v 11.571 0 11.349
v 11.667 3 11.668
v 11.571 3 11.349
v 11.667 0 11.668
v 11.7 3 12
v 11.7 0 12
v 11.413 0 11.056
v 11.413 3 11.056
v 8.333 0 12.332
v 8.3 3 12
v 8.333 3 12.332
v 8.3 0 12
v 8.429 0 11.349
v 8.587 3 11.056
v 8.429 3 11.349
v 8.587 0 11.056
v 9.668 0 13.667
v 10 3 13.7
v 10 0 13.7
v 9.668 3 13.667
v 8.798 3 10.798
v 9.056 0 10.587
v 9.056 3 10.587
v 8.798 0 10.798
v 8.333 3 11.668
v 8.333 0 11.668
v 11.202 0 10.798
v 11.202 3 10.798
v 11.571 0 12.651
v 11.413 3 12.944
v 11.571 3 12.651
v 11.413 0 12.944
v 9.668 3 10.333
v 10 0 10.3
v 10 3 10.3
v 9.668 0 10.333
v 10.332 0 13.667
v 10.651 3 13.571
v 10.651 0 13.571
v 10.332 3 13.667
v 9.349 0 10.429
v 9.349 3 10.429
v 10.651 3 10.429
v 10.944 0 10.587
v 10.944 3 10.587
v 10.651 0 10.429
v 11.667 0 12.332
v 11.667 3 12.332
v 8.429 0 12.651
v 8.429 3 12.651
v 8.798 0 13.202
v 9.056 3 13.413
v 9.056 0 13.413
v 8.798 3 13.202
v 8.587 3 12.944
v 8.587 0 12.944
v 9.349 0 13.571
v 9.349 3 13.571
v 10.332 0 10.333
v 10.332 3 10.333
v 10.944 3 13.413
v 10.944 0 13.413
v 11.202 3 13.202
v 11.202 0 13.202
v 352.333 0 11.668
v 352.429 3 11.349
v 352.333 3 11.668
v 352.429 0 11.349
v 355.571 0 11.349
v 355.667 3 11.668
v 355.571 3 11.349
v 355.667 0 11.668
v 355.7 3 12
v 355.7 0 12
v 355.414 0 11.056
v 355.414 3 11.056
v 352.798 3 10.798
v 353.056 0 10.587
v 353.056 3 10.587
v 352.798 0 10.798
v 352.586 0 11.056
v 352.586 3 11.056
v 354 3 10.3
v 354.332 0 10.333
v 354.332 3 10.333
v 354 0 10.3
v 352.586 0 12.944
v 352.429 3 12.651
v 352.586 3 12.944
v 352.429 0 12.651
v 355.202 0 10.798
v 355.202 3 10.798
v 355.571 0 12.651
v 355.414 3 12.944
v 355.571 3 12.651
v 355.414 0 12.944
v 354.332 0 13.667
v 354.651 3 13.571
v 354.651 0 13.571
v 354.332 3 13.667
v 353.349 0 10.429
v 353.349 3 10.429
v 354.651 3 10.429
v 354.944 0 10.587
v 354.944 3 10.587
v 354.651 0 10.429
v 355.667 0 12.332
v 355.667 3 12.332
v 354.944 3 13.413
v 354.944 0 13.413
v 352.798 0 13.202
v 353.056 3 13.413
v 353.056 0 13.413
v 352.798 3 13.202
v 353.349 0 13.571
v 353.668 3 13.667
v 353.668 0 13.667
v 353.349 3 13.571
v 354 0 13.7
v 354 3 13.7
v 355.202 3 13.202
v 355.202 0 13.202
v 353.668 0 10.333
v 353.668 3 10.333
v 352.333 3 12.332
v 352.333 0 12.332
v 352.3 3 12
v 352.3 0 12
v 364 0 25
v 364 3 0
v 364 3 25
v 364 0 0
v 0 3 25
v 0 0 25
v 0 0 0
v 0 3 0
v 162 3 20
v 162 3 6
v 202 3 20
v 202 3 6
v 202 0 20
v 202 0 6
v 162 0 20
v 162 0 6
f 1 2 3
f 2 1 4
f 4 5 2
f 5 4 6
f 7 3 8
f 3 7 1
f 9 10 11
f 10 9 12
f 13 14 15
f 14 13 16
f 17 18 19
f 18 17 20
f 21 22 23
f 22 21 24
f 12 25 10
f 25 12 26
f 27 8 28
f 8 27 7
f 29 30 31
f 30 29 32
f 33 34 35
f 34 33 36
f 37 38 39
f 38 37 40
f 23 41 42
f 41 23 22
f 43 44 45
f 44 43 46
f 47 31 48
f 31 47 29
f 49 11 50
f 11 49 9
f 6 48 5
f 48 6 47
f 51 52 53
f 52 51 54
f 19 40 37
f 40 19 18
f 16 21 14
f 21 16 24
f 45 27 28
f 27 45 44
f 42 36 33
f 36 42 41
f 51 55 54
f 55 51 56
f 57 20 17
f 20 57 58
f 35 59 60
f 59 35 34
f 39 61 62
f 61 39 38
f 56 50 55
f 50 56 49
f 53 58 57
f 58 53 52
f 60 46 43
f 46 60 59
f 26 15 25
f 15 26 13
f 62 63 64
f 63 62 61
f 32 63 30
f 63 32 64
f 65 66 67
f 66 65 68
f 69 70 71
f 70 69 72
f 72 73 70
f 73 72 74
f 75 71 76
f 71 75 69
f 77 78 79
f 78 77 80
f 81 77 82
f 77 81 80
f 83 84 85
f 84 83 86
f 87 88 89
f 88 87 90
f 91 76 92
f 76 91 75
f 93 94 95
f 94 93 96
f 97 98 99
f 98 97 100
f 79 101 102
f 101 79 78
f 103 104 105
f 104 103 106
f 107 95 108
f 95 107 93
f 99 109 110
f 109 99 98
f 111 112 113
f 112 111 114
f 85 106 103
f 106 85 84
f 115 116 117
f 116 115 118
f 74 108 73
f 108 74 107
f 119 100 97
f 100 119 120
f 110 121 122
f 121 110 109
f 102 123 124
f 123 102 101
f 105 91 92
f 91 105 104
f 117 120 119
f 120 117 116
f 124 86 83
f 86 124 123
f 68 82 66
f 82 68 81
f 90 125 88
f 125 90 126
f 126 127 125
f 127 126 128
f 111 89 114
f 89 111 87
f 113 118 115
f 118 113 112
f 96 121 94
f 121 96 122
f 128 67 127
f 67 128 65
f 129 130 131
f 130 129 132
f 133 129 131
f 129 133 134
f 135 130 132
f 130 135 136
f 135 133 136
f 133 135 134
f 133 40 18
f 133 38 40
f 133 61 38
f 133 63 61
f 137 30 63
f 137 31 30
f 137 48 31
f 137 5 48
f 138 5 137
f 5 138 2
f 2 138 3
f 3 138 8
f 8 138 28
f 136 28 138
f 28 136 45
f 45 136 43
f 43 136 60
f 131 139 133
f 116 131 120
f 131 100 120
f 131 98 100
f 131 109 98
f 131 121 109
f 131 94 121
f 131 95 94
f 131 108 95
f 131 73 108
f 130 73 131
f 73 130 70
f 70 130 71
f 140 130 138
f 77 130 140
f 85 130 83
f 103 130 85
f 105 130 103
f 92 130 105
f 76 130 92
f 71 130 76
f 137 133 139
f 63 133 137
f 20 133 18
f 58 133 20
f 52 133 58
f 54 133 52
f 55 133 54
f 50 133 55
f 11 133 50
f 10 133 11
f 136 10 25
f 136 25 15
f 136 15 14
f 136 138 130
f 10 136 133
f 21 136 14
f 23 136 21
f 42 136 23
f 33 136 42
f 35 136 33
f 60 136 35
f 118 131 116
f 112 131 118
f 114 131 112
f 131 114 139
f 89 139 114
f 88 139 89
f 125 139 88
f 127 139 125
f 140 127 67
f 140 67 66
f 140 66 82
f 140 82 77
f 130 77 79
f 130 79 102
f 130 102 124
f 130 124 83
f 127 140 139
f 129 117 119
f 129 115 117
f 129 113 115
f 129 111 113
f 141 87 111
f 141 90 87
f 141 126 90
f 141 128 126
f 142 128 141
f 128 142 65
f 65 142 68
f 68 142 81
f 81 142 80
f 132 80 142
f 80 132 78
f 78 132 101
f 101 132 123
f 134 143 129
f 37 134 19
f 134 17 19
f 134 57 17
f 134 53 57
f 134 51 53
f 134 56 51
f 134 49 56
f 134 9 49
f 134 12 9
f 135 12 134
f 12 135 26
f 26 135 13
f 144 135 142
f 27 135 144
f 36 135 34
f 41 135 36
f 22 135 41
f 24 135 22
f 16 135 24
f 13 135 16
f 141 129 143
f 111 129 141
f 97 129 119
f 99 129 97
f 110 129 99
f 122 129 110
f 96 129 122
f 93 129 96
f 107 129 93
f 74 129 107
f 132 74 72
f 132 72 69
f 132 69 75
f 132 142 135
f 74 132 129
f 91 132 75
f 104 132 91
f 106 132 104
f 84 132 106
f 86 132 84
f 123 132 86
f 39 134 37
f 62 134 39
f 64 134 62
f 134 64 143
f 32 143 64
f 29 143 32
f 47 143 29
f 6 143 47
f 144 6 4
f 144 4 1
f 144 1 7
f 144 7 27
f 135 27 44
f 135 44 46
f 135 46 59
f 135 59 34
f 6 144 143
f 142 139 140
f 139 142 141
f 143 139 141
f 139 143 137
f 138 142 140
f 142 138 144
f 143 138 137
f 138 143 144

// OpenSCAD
// ModuDeck donor chassis study: NOT a verified ThinkPad fit.
// Millimetres. 370x240 is an unconfirmed owner measurement.
$fn=32; W=370; D=240; t=3;
module plate(w,d,h){cube([w,d,h]);}
module shell(w,d,h){difference(){cube([w,d,h]);translate([t,t,t])cube([w-2*t,d-2*t,h]);}}
module hole(x,y,h){translate([x,y,-1])cylinder(d=3.4,h=h+2);}
module rail(n){difference(){cube([n,12,6]);for(x=[10:20:n-10])hole(x,6,6);}}
module rear(){difference(){cube([W-6,3,25]);translate([W/2-23,-1,6])cube([40,5,14]);for(x=[10,W-16])translate([x,-1,12])rotate([-90,0,0])cylinder(d=3.4,h=5);}}
module tray(){difference(){shell(W,D,30);translate([3,D-4,3])cube([W-6,6,27]);for(x=[15,W-15],y=[15,D-15])hole(x,y,30);}}
rear();
